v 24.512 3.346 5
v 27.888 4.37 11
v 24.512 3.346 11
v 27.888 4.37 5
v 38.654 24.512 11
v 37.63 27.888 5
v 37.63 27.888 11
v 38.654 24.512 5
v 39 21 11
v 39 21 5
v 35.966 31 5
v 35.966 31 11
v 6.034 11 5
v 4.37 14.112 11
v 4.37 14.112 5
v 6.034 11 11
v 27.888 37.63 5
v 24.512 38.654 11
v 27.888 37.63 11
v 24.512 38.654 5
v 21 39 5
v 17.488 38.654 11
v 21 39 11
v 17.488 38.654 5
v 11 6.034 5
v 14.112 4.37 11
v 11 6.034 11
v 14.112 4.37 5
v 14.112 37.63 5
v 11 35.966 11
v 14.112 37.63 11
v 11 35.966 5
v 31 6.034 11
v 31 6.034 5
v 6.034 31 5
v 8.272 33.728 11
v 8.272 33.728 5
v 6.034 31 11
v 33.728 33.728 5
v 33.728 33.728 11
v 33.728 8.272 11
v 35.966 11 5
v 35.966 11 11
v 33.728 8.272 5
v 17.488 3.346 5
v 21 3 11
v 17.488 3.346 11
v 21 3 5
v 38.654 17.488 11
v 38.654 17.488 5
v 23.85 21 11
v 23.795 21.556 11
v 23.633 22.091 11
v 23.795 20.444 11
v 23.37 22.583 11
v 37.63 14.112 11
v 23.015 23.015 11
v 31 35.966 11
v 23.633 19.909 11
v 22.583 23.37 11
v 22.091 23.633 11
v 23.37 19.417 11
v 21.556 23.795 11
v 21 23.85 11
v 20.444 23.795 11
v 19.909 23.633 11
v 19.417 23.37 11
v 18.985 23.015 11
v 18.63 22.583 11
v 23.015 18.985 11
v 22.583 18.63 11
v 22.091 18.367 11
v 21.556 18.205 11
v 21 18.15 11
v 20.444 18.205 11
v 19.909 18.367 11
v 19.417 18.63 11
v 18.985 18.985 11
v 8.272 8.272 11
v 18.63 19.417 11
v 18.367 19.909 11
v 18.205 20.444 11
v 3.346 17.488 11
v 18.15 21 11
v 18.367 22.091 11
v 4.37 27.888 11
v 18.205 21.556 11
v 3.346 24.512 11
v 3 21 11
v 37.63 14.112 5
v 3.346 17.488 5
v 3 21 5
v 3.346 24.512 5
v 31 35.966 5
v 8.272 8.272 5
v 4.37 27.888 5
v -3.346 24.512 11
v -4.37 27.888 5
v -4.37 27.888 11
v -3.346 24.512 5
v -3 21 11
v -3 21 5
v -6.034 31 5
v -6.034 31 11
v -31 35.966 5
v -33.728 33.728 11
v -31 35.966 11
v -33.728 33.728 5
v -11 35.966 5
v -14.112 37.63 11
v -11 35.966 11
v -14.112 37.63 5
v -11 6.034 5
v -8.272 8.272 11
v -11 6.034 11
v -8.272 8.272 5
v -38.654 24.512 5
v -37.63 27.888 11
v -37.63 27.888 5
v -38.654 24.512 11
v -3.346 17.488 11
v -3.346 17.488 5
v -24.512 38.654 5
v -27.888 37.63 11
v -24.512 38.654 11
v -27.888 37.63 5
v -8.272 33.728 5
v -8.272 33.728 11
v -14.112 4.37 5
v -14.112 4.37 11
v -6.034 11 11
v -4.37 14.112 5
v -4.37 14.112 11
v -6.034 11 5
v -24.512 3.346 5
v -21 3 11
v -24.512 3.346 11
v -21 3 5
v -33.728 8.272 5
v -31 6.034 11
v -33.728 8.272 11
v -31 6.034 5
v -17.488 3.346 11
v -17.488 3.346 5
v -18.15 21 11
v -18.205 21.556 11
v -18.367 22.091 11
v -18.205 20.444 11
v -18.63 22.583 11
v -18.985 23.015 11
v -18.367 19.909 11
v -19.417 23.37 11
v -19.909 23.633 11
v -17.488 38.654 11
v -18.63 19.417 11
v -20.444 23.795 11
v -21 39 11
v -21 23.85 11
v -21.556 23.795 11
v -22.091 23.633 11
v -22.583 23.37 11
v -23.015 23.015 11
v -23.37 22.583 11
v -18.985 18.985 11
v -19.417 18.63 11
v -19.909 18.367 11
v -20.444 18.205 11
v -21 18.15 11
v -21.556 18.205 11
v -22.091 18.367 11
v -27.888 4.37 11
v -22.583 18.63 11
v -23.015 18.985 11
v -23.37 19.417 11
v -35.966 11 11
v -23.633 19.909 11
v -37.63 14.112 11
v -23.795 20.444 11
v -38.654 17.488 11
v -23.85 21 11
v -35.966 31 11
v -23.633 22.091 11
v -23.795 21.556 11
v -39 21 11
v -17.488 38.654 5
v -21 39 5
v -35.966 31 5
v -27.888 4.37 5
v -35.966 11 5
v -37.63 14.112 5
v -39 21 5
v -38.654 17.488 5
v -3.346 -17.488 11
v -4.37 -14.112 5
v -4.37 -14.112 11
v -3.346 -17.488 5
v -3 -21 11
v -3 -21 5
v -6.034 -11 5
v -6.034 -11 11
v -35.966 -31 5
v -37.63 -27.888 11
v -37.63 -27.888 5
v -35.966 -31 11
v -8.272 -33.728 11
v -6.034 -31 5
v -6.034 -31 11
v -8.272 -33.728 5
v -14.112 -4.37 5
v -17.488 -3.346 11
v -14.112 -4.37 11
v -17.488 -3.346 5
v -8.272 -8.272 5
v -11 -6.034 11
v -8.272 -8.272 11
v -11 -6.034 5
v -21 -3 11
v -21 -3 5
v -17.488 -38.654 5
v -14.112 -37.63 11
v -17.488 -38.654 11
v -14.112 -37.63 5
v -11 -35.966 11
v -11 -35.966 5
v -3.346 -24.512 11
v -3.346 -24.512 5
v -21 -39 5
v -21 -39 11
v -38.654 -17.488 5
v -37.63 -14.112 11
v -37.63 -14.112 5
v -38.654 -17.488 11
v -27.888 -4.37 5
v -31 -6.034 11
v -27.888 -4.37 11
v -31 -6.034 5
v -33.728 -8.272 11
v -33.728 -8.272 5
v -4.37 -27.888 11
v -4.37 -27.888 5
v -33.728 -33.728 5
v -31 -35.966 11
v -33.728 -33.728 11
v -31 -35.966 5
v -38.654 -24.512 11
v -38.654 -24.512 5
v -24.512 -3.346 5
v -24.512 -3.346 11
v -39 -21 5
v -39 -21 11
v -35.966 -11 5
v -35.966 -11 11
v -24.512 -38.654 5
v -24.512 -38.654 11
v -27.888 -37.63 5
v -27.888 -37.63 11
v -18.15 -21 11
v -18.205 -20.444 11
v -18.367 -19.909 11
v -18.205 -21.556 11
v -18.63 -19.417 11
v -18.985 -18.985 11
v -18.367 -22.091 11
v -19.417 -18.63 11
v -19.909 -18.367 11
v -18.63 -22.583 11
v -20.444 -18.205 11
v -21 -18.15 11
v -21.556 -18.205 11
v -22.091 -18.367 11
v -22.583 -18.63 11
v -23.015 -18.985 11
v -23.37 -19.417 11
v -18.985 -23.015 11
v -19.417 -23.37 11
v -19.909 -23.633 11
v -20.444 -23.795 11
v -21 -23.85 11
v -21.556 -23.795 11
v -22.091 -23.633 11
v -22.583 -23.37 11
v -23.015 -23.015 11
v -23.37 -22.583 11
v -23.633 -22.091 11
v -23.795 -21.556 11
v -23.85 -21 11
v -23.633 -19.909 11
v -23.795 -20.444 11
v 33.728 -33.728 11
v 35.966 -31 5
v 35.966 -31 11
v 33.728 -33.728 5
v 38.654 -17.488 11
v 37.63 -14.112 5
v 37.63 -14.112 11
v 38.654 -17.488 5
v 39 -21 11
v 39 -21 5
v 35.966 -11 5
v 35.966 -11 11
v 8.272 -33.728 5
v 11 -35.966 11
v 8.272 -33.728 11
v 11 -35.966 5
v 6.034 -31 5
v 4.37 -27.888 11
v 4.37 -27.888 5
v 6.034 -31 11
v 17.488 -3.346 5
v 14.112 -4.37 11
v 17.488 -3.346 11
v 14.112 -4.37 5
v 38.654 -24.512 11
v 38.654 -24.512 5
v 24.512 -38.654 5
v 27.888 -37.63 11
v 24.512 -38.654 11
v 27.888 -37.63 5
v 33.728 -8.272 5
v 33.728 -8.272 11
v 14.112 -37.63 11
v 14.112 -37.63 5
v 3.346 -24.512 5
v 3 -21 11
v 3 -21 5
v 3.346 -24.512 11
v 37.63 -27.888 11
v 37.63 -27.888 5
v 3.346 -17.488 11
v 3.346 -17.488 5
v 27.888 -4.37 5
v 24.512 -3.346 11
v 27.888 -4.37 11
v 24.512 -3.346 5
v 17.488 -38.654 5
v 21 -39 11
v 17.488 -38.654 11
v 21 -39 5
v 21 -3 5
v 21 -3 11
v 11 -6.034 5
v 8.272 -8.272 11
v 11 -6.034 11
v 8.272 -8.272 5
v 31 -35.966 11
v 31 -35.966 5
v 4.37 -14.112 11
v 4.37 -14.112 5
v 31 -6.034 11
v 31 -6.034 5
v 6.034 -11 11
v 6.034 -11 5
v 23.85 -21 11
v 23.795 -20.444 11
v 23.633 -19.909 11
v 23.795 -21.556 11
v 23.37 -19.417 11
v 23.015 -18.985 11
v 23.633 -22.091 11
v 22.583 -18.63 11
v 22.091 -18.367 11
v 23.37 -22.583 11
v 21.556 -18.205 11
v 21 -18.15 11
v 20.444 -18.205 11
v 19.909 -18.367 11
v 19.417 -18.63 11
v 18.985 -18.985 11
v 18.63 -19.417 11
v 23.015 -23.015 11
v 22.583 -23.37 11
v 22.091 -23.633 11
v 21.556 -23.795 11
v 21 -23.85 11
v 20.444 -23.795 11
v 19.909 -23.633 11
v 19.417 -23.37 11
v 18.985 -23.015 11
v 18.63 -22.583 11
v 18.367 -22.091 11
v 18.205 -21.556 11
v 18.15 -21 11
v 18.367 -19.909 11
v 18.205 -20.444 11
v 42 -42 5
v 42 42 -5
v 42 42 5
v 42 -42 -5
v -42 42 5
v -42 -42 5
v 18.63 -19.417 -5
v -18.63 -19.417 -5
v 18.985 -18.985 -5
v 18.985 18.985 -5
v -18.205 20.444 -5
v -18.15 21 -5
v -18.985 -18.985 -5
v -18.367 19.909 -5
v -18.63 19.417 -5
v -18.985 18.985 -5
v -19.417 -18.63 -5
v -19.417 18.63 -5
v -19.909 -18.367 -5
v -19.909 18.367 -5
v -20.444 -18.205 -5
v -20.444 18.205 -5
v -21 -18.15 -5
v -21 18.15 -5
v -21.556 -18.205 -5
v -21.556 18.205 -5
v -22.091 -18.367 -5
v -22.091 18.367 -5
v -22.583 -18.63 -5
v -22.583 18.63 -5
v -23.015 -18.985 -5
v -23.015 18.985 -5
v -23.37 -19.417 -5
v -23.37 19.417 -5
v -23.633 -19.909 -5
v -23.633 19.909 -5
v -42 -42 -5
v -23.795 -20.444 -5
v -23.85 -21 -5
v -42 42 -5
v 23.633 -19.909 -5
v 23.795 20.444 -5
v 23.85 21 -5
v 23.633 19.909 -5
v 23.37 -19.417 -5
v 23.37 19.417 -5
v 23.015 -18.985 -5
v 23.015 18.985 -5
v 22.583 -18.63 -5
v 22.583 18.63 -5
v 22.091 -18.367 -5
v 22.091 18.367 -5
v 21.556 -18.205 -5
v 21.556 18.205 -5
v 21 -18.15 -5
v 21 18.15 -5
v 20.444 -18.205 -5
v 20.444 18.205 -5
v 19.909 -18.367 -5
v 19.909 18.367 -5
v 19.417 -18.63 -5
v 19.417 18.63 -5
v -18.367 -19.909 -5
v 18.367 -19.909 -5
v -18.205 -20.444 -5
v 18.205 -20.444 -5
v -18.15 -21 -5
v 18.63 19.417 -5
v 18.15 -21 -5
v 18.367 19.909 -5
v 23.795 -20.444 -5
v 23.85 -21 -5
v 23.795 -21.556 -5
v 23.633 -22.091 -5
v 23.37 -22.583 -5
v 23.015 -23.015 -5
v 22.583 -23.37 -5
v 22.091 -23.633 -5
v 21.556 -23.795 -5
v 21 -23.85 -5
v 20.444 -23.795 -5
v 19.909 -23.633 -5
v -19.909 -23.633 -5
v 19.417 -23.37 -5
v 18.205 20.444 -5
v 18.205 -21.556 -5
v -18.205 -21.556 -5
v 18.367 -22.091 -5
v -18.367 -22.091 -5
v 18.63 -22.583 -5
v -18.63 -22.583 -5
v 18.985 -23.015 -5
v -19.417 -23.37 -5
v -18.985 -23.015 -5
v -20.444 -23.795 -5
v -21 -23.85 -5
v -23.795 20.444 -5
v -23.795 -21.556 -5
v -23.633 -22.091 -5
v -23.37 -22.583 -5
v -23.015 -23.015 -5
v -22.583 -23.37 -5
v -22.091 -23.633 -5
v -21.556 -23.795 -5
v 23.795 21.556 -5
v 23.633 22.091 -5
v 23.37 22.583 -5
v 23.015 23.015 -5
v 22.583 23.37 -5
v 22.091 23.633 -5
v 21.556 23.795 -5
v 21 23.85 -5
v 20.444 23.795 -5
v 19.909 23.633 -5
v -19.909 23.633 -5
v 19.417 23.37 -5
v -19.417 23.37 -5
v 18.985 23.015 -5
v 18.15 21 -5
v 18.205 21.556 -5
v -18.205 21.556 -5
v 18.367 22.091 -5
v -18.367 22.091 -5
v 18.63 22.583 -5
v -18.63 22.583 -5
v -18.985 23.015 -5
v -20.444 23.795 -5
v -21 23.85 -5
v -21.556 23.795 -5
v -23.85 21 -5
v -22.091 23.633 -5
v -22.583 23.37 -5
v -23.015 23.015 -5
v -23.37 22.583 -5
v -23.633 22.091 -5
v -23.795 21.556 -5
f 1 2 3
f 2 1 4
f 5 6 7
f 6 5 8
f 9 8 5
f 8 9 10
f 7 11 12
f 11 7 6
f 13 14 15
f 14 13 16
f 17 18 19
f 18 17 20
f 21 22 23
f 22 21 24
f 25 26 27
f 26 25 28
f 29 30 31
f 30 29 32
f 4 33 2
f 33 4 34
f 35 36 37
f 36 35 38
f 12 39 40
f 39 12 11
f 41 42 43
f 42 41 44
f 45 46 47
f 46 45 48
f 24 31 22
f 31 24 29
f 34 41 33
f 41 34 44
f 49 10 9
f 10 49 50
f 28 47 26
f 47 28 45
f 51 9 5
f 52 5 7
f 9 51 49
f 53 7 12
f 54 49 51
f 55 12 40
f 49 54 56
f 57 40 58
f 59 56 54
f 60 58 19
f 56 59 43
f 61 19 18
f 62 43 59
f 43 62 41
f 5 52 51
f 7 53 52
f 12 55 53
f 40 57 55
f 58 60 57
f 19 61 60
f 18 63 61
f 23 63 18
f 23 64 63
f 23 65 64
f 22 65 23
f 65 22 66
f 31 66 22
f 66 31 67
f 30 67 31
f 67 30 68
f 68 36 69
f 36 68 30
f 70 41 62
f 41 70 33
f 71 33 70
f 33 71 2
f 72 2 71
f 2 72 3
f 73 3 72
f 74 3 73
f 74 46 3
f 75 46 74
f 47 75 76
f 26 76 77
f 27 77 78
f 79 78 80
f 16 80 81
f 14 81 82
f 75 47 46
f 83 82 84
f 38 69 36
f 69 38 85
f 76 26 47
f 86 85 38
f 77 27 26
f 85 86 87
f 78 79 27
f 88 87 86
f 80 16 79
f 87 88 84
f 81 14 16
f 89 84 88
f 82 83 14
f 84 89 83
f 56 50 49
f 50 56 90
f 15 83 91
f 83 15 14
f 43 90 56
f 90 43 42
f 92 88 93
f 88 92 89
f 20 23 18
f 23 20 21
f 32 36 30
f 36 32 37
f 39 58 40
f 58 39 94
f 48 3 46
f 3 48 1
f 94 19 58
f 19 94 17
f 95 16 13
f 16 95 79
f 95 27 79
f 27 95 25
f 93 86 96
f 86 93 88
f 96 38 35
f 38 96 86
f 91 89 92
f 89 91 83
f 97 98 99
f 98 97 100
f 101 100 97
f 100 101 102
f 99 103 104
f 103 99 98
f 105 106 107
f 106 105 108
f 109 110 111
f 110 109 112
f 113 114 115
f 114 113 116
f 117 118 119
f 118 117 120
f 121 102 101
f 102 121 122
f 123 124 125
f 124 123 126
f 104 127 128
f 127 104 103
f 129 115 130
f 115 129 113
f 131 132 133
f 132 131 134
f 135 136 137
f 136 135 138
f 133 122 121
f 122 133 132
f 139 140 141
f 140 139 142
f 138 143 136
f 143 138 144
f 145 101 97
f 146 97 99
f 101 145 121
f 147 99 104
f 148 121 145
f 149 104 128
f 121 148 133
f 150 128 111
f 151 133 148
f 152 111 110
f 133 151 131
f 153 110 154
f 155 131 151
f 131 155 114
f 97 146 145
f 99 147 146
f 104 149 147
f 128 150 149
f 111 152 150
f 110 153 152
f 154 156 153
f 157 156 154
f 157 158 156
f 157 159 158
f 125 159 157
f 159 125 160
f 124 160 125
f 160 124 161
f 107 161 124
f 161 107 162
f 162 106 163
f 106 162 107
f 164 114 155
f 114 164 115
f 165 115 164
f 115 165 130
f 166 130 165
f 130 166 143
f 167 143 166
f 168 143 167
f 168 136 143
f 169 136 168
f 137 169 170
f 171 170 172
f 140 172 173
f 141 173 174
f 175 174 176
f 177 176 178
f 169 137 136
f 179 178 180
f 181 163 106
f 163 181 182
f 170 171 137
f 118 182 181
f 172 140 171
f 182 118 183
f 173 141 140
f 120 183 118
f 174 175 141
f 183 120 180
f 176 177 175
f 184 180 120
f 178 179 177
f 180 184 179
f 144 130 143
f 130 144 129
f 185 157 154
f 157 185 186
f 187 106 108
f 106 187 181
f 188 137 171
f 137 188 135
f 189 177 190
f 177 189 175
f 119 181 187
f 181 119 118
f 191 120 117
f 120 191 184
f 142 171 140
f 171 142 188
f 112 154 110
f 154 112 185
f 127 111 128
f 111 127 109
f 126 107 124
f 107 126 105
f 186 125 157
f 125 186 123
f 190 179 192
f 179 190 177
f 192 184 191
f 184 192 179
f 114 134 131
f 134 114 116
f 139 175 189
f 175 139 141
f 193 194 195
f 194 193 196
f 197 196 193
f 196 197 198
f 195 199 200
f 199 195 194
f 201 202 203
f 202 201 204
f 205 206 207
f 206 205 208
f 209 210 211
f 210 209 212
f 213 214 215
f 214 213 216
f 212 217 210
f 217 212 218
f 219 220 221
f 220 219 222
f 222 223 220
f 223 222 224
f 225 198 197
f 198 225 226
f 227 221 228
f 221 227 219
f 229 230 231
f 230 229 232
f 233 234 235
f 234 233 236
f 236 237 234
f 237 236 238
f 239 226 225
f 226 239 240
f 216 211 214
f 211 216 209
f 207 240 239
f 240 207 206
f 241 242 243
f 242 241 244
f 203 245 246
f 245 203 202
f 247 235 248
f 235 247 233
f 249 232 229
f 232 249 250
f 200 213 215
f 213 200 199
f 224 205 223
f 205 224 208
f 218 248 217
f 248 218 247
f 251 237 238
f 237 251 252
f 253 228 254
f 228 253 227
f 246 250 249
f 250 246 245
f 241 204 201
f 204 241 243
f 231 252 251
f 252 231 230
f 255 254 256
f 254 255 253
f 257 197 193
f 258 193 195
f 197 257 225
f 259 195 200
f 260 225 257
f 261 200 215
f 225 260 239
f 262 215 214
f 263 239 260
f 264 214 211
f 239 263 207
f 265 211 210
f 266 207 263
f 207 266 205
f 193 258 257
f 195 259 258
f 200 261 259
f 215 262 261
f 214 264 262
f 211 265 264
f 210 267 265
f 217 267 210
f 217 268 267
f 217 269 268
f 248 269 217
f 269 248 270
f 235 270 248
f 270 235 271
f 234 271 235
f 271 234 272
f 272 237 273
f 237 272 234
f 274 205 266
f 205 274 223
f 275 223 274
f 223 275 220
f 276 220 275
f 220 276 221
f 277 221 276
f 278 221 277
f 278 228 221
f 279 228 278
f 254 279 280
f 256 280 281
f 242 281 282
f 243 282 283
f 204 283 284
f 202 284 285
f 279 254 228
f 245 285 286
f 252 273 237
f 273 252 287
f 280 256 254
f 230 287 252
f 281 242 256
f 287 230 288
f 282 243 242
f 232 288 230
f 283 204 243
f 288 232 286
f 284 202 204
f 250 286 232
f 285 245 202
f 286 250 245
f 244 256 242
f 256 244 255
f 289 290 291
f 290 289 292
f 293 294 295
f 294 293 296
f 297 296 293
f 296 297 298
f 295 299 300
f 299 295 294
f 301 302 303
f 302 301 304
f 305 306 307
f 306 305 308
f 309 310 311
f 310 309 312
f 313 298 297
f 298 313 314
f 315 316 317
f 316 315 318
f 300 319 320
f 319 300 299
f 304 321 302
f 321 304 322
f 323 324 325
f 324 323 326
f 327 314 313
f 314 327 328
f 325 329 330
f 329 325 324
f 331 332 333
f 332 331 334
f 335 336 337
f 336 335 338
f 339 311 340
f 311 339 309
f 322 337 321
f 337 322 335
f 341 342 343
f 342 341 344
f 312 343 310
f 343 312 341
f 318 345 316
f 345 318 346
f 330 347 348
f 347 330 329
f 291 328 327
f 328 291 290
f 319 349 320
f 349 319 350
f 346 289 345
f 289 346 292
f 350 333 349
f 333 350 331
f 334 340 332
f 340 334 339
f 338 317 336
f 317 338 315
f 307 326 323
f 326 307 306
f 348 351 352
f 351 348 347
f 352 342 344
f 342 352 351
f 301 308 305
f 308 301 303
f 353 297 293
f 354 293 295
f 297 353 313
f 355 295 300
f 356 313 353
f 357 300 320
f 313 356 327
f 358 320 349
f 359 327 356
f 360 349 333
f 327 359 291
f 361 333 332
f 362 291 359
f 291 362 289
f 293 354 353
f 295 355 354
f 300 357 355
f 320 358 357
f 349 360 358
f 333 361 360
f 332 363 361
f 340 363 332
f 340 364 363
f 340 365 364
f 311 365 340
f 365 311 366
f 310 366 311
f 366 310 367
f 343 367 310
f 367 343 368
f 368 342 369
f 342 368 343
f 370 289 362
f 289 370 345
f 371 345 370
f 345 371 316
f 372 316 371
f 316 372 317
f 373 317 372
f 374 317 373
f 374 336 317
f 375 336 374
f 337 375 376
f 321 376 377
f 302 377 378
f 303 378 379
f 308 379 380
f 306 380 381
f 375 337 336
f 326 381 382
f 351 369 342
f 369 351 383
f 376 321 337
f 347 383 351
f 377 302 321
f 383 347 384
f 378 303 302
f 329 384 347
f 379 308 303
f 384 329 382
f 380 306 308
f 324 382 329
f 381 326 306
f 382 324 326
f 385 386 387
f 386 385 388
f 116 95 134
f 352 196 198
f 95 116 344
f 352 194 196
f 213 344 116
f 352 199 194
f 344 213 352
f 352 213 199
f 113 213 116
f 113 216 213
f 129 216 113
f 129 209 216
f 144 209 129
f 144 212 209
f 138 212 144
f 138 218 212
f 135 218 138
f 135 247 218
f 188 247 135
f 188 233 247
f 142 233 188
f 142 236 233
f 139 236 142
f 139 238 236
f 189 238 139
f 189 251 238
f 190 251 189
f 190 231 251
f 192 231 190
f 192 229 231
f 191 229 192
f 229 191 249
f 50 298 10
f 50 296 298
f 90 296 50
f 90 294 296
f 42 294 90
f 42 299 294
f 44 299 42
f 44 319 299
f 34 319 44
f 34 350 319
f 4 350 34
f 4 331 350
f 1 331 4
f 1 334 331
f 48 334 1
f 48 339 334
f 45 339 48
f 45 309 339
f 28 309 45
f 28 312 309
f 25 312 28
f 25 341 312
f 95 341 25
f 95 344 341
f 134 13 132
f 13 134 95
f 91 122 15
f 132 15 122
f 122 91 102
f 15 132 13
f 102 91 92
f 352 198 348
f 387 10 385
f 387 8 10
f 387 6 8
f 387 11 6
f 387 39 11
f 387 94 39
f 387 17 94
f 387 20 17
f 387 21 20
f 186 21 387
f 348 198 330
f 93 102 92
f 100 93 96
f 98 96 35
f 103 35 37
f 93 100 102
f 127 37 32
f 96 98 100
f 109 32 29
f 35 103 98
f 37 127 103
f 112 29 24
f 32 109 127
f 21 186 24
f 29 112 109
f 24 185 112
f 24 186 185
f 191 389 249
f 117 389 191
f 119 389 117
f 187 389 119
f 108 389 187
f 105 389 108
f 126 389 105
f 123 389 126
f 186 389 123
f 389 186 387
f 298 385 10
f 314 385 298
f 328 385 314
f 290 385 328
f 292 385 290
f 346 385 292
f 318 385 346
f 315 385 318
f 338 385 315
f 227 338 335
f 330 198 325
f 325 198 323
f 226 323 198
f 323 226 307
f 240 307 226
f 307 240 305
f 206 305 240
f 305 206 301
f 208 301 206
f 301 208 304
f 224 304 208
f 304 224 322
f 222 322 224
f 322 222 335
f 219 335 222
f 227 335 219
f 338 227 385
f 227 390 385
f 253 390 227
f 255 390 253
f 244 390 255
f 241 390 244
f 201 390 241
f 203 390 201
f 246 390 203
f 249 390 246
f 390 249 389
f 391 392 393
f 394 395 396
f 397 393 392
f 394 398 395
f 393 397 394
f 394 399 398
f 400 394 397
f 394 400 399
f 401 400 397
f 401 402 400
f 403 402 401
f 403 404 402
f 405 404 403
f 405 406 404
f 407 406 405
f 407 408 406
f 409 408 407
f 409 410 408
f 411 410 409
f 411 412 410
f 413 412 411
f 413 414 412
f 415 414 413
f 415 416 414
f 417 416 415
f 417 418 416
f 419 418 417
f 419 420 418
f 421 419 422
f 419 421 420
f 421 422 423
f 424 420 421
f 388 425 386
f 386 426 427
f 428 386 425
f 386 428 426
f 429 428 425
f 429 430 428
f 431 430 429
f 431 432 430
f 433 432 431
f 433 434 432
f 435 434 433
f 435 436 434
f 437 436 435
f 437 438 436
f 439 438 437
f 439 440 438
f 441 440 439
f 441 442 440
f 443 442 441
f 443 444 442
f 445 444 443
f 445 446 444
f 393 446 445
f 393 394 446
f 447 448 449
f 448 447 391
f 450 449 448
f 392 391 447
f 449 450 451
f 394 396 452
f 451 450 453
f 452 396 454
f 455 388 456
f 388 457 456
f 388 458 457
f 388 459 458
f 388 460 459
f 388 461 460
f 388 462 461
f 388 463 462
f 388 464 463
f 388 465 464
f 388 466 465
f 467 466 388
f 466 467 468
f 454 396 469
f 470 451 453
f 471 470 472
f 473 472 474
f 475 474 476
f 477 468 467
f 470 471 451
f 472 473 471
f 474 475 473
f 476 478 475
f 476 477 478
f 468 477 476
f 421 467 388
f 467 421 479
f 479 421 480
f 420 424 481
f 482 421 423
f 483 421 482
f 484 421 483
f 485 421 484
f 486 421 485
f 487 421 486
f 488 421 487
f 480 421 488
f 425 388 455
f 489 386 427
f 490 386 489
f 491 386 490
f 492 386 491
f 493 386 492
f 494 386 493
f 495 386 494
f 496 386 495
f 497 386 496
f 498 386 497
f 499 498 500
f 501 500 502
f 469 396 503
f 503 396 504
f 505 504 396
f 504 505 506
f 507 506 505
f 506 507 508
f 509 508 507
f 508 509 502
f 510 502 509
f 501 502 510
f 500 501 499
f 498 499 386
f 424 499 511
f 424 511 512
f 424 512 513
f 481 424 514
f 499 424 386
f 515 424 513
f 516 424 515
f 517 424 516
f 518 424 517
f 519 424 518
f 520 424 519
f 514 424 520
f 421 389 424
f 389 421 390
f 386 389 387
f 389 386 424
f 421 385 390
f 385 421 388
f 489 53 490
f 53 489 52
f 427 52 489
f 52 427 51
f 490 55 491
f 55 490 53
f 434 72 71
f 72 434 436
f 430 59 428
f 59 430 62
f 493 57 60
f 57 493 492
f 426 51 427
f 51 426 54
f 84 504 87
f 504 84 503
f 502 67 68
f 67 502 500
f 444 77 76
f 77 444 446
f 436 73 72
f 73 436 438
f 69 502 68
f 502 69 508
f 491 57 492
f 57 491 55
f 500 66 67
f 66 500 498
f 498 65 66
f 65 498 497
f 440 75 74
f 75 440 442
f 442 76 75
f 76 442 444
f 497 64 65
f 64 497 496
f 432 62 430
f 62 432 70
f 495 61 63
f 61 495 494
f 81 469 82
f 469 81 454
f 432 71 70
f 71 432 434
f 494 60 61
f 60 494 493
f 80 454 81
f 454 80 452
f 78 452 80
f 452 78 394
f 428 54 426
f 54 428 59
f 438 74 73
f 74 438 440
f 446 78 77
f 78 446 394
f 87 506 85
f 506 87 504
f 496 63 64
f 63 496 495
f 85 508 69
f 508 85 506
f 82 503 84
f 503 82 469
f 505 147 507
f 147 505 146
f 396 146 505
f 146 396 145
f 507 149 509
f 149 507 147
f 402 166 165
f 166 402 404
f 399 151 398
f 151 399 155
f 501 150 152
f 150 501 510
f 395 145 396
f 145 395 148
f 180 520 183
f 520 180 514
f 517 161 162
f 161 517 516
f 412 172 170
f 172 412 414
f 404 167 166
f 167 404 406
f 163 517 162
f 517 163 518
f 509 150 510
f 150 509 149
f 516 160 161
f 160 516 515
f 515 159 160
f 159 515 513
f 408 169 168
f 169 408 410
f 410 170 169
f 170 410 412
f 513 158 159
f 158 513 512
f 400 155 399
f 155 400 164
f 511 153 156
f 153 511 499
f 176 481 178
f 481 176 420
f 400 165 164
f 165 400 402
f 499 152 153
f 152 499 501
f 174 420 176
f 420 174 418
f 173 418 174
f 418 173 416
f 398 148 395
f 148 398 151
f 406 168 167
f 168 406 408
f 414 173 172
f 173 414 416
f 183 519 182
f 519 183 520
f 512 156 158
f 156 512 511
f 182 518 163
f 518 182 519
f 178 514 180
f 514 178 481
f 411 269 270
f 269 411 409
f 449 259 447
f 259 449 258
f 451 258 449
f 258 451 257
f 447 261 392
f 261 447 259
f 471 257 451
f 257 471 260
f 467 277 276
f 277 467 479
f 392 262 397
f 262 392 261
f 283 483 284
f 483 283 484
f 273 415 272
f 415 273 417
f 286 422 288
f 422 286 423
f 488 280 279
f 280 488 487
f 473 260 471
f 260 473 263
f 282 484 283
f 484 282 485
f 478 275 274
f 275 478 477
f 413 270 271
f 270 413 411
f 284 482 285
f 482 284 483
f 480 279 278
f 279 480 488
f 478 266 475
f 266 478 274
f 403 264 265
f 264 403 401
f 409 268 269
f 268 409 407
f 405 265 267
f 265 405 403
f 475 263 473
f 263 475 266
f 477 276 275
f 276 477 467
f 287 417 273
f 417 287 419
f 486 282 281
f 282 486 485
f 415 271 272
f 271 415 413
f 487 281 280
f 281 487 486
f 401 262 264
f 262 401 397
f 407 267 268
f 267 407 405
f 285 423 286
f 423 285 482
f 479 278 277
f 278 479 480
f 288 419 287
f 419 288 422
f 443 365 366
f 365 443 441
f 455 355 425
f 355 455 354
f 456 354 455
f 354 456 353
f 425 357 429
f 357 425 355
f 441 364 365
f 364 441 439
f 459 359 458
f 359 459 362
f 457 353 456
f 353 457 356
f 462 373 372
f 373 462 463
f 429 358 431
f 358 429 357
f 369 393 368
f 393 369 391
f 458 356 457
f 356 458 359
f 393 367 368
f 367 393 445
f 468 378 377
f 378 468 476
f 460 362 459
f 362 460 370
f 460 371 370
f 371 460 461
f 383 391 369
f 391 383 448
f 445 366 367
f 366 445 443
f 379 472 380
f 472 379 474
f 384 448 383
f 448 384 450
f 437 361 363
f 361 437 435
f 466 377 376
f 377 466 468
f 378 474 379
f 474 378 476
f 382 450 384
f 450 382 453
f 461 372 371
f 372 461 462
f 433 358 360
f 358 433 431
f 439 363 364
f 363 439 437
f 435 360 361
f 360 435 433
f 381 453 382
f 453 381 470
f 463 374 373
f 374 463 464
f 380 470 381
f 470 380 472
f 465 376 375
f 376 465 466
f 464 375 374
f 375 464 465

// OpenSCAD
$fn = 32;

// ----------------------------------------------------------------------
// Anchor pads 84 x 84 x 16
// four corner bosses with anchor holes
// ----------------------------------------------------------------------

// --- parameters (mm) ---
plate = [84, 84, 10];   // base plate size (x, y, z)
pads = 4;               // boss count, one per corner
edge = 21;              // boss centre offset from the plate edge
boss_d = 36;            // boss diameter
boss_h = 6;             // boss height above the base plate
bore_d = 5.5;           // nominal hole diameter from the drawing
print_allowance = 0.2;  // clearance added for printing

// --- derived feature positions (mm) ---
hole_d = bore_d + print_allowance;  // = 5.7   hole diameter as printed
height = plate[2] + boss_h;         // = 16   overall height of the part
corner_x = plate[0] / 2 - edge;     // = 21   boss centre X
corner_y = plate[1] / 2 - edge;     // = 21   boss centre Y
feature_centers = [
  [corner_x, corner_y],
  [-corner_x, corner_y],
  [-corner_x, -corner_y],
  [corner_x, -corner_y]
];   // boss centres, anchor holes are drilled there

// base plate, four bosses standing on it, anchor holes all the way through
difference() {
  union() {
    cube(plate, center = true);
    for (centre = feature_centers)
      translate([centre[0], centre[1], plate[2] / 2 - 1])
        cylinder(d = boss_d, h = boss_h + 1);
  }
  for (centre = feature_centers)
    translate([centre[0], centre[1], -height])
      cylinder(d = hole_d, h = 2 * height + 2);  // through boss and plate
}
